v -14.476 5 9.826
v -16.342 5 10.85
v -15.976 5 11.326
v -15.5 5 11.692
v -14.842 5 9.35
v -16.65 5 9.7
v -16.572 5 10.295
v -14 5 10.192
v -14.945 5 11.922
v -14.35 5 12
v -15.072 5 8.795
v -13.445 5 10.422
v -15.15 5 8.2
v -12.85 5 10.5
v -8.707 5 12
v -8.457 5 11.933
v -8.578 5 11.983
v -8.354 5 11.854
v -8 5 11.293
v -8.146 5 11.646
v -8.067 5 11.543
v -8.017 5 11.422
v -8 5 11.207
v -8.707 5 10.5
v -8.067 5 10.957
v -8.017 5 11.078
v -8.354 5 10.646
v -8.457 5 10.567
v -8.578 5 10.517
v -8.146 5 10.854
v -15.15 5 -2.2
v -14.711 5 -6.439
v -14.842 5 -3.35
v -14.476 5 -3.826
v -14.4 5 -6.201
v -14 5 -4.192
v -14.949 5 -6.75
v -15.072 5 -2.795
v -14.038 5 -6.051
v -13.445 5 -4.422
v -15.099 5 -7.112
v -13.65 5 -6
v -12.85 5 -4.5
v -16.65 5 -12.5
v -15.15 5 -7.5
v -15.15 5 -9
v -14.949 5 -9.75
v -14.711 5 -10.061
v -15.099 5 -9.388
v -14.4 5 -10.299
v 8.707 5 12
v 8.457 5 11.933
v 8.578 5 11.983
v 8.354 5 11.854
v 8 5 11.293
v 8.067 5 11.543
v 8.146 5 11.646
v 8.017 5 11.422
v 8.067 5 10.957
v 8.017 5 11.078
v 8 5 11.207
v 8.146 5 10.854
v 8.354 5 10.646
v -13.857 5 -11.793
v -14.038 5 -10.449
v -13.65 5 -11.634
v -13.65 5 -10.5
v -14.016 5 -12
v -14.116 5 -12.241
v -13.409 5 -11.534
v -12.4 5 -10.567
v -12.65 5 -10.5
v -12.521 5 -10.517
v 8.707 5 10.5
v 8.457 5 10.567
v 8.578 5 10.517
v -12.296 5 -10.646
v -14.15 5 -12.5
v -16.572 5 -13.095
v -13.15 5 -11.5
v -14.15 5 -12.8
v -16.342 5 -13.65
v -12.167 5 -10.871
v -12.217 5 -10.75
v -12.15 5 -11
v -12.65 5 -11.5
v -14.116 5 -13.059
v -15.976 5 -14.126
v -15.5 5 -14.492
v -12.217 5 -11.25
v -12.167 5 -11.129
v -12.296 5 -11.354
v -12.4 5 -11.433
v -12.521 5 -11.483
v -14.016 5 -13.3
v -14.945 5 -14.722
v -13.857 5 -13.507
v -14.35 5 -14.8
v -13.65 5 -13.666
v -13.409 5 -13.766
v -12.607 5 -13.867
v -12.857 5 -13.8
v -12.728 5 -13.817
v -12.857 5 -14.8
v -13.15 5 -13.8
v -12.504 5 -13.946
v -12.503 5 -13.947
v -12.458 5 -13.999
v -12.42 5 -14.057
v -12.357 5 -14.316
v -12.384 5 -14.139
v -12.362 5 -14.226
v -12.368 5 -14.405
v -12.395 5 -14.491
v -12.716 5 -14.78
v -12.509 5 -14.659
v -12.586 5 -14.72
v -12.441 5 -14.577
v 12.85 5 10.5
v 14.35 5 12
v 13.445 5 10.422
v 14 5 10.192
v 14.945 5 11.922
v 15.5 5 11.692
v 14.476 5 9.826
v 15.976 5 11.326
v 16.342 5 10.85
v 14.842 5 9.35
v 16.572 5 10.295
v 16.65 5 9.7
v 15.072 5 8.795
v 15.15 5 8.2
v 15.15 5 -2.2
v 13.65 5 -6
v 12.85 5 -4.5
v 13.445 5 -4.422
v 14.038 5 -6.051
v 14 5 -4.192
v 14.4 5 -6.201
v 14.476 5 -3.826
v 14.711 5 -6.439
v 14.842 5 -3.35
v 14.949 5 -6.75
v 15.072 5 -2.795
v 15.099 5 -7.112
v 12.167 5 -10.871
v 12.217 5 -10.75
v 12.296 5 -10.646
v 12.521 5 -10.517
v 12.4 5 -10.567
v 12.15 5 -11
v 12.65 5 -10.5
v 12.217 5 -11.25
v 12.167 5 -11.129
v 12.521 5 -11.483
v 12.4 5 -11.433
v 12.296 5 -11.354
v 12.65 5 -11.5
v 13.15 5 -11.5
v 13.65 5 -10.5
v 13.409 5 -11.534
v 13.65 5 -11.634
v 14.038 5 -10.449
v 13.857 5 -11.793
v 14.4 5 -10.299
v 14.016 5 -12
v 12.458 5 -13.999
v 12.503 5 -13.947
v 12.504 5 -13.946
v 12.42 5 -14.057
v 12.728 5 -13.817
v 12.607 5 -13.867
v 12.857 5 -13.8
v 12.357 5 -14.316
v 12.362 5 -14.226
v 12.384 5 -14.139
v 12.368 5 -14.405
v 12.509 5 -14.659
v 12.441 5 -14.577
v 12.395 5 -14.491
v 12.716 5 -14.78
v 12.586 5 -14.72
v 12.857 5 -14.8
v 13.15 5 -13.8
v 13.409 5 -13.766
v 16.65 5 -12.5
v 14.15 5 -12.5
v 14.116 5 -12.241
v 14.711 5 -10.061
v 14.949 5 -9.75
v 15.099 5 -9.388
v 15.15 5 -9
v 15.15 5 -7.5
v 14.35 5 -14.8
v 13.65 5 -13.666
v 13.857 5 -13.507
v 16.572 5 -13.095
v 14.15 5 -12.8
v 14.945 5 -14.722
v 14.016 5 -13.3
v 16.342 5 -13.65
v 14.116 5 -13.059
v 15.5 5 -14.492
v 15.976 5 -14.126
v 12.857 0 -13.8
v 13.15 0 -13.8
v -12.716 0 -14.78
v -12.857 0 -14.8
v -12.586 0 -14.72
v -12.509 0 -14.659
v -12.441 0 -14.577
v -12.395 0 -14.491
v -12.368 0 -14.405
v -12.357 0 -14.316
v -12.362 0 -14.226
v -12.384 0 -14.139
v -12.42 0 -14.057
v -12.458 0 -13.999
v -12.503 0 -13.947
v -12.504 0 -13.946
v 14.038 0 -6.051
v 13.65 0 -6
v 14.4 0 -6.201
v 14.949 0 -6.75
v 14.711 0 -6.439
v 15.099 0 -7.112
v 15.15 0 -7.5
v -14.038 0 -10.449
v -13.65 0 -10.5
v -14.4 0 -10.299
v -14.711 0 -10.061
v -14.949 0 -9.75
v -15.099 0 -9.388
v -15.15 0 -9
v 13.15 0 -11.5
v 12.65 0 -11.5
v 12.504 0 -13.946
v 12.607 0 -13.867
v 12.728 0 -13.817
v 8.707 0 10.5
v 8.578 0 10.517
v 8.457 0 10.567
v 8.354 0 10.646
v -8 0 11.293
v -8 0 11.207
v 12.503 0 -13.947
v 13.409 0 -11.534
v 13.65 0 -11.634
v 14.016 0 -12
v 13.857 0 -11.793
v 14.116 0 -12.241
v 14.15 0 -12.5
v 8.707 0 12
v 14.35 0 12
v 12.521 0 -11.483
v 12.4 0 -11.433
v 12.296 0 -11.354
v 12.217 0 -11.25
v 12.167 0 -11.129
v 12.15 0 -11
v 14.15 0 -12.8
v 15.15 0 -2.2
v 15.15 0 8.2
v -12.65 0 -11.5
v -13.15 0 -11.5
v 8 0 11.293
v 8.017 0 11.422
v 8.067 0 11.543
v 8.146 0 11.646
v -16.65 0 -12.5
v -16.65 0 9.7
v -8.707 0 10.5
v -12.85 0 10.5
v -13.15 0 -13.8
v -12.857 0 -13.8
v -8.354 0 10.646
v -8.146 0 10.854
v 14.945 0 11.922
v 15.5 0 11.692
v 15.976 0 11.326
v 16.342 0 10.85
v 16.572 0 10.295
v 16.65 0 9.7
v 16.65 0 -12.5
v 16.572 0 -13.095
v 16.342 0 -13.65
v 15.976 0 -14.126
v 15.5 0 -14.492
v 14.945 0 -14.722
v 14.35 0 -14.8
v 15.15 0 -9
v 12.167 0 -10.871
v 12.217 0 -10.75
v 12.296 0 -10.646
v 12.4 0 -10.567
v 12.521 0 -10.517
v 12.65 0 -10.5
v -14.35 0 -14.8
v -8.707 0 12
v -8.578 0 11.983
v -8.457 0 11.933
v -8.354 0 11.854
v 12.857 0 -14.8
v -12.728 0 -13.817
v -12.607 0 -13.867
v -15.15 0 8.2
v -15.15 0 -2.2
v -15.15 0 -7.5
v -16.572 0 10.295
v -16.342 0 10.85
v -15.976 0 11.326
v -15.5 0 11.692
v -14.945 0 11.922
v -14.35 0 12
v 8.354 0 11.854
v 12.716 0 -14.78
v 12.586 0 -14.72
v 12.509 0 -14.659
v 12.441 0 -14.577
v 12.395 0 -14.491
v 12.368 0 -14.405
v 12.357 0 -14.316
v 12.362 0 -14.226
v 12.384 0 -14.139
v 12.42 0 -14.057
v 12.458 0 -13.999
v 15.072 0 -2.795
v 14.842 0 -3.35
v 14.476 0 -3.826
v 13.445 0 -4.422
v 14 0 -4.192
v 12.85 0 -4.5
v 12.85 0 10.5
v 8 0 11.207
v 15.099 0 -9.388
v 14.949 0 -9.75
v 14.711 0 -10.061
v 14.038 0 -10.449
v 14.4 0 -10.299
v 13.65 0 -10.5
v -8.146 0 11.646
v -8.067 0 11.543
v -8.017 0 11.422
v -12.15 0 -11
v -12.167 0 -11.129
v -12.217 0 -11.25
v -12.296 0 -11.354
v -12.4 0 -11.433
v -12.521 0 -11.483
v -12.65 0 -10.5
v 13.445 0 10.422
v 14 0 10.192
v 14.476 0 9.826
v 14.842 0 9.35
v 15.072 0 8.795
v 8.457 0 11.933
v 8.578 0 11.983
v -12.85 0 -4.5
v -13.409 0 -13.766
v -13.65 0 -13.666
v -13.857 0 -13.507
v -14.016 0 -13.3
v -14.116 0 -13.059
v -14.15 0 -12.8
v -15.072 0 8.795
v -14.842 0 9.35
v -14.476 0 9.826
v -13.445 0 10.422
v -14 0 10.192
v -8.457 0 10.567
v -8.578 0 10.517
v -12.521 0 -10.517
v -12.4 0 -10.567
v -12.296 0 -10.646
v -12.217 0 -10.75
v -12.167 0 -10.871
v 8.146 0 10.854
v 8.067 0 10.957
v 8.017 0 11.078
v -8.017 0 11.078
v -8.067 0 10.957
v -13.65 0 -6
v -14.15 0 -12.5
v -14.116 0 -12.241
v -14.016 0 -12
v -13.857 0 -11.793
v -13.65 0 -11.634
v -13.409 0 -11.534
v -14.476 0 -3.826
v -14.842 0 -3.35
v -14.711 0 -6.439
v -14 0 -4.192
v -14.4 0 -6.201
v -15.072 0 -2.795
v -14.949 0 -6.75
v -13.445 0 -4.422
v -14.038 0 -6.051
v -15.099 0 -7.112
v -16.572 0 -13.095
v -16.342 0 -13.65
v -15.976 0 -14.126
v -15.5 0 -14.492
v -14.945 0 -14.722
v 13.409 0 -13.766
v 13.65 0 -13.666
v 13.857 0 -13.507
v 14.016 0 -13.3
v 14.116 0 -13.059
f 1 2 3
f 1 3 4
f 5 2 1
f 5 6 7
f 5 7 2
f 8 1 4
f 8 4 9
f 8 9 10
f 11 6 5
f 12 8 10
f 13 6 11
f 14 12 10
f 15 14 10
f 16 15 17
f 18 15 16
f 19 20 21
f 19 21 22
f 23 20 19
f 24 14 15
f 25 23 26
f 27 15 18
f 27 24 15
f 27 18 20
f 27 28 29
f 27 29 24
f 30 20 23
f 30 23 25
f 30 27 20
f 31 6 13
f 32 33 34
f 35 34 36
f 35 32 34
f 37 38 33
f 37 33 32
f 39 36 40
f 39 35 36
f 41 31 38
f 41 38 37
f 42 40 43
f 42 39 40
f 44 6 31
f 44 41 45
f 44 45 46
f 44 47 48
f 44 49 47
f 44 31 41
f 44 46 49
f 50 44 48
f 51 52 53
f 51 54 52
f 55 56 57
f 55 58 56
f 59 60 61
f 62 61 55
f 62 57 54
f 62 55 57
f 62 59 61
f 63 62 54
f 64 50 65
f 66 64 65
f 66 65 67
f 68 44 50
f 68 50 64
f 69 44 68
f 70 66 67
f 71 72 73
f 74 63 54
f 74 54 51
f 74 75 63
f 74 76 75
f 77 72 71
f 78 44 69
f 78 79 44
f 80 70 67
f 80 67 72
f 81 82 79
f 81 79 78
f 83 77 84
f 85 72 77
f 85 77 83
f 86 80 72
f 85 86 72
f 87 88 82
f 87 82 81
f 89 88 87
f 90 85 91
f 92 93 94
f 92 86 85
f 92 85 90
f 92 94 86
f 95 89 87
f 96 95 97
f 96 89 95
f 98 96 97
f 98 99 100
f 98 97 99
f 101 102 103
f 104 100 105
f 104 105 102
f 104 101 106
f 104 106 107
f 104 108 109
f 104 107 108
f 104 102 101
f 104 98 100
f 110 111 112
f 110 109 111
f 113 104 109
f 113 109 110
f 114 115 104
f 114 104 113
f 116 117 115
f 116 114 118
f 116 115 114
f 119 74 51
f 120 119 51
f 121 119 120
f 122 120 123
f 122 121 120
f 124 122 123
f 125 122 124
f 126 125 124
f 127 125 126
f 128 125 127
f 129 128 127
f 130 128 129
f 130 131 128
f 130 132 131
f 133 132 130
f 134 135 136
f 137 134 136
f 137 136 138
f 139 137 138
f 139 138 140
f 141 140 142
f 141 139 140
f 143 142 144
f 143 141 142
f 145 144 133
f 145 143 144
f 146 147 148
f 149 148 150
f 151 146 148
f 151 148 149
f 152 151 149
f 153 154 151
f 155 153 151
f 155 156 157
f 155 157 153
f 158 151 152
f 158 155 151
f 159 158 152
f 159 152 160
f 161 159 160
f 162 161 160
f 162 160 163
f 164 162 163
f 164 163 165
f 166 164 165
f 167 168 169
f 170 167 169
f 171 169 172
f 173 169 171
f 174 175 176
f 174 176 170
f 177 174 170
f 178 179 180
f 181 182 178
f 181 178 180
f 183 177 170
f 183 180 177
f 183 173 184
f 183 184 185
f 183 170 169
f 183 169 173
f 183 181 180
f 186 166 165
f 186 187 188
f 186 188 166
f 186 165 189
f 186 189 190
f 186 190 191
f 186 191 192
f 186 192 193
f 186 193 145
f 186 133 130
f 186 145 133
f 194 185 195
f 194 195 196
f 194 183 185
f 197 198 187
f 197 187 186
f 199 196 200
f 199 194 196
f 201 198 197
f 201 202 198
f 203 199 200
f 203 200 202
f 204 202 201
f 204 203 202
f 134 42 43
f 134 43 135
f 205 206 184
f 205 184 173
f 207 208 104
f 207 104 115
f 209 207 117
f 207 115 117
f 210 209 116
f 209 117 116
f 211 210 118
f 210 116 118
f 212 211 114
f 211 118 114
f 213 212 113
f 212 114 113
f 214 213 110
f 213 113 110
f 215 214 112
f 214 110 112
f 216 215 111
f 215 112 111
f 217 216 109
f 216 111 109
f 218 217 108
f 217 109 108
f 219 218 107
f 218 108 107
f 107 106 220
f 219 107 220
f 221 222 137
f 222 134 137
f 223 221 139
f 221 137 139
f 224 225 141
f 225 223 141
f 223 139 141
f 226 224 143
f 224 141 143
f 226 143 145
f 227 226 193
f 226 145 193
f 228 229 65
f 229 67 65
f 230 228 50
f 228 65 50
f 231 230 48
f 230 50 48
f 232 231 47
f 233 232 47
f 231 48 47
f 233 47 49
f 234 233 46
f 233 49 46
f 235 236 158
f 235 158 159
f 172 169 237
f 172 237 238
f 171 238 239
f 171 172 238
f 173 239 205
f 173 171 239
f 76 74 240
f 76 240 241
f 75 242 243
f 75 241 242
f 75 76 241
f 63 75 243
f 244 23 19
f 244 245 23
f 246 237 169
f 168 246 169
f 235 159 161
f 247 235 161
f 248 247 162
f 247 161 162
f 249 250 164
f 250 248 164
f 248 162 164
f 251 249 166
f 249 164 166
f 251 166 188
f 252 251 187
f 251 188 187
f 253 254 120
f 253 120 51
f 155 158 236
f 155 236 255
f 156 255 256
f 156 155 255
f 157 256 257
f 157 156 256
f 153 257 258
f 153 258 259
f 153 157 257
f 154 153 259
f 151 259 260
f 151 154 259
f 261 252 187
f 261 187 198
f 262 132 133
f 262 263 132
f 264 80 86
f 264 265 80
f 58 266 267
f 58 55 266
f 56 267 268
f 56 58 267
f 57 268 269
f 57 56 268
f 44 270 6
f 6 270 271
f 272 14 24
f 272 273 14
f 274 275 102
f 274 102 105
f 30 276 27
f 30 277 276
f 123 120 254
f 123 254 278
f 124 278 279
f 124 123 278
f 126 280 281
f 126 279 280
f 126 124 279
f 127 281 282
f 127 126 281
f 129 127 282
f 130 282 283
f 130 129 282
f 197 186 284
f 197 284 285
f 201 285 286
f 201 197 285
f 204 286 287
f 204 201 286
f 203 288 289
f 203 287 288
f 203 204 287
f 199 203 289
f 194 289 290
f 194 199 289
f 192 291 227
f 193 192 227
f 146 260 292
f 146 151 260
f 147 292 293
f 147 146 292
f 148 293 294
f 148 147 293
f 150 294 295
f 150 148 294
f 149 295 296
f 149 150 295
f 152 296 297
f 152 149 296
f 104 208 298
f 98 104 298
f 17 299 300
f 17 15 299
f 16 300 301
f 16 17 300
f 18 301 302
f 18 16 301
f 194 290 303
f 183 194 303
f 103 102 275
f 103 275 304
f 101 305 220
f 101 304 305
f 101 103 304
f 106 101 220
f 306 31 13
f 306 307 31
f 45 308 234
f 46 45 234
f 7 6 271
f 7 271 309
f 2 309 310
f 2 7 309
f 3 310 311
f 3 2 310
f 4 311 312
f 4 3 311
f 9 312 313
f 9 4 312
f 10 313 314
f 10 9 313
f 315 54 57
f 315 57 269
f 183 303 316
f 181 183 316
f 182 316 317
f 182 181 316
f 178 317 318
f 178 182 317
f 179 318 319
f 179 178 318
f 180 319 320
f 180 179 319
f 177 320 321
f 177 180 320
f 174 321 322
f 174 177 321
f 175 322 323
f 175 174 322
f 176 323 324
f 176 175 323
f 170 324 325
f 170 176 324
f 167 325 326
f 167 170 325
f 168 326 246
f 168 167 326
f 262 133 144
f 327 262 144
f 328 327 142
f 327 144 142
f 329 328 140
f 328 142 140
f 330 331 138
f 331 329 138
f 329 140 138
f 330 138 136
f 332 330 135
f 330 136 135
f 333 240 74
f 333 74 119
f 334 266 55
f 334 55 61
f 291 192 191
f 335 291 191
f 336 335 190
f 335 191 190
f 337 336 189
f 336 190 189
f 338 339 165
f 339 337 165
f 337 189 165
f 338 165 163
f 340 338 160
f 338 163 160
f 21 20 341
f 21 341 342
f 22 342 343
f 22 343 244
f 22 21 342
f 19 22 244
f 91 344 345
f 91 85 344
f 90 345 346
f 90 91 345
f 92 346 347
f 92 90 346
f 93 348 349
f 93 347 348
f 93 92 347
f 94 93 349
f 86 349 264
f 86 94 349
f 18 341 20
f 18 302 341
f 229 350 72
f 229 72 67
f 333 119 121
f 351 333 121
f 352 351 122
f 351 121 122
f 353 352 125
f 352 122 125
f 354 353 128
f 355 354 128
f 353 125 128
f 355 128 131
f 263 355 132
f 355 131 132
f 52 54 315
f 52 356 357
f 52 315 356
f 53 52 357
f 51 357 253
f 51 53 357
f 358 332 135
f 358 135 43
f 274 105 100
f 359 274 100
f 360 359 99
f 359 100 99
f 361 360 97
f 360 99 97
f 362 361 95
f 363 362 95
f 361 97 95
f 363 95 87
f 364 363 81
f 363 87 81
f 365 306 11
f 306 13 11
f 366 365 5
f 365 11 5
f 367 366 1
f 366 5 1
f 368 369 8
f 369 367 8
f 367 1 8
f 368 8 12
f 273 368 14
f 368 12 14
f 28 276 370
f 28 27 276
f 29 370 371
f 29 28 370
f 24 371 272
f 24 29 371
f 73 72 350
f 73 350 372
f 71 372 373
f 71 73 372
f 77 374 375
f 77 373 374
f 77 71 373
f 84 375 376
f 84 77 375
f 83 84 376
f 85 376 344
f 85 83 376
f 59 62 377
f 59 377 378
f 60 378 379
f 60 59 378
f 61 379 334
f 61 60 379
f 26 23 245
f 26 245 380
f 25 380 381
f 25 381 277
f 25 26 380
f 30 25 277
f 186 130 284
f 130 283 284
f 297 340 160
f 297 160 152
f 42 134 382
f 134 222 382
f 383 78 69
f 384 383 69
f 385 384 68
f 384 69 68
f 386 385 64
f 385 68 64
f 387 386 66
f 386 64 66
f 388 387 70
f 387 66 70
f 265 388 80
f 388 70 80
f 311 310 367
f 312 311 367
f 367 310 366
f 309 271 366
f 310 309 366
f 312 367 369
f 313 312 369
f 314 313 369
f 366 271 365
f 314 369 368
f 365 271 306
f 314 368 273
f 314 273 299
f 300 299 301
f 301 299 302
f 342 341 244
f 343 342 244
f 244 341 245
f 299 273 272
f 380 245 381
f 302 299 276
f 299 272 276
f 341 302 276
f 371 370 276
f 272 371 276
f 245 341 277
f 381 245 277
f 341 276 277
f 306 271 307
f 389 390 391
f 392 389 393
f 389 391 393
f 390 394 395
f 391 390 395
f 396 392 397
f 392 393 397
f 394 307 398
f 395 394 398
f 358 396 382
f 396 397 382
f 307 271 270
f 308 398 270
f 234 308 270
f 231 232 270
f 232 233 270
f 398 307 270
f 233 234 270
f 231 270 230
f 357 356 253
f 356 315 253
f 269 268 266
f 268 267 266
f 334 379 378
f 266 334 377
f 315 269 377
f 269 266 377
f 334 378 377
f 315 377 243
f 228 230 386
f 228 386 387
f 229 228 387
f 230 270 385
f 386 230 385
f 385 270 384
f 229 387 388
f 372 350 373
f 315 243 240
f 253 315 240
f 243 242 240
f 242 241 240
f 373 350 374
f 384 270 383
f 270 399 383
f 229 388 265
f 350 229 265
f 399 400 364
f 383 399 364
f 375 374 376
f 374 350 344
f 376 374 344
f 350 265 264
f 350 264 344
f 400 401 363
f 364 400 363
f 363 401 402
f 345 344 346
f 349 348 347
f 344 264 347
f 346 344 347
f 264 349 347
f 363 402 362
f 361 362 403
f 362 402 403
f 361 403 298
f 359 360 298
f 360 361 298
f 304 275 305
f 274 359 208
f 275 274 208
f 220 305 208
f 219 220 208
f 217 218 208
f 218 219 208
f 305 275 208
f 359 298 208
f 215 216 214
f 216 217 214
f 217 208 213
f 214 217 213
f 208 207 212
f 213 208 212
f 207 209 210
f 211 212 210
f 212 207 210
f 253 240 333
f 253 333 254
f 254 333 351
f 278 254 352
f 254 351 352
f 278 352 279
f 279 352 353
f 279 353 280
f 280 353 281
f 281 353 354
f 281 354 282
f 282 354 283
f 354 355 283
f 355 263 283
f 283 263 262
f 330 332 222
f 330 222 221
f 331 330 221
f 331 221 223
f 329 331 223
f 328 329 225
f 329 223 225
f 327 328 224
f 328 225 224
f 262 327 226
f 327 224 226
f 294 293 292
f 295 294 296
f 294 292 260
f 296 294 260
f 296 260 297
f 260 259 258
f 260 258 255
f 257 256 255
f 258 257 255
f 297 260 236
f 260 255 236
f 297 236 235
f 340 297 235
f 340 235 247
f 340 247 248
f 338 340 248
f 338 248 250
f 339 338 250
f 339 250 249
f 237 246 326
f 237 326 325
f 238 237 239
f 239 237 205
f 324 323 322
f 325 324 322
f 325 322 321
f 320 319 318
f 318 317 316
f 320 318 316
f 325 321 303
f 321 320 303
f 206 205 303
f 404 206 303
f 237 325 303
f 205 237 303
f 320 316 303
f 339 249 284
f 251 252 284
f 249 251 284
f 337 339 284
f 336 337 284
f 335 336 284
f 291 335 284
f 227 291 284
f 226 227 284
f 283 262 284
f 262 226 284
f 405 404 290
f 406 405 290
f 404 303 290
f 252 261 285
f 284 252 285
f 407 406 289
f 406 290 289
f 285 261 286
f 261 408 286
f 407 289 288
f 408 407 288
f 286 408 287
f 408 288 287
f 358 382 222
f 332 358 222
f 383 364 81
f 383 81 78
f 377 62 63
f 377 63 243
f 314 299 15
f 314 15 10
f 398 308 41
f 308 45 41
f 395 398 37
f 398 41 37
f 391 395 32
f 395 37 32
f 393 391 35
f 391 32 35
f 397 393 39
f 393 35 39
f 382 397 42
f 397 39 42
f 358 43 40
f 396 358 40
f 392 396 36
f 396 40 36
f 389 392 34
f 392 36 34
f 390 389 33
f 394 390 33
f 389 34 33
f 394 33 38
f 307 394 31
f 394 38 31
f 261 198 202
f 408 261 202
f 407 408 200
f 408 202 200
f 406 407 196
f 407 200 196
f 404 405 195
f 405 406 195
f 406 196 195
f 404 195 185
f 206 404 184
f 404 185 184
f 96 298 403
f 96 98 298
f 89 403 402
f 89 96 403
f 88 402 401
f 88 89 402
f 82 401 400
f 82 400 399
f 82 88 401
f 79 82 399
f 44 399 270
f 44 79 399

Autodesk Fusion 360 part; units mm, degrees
sketch "Sketch1" plane through (0, 0, 0) normal (0, 1, 0) x (1, 0, 0)
  line L0 (-12.15, 14.8) -> (-16.65, 14.8)
  line L1 (-16.65, 14.8) -> (-12.15, 14.8)
  line L2 (-12.15, 13.8) -> (-14.15, 13.8)
  line L3 (-15.15, -10.5) -> (-8, -10.5)
  line L4 (-8, -10.5) -> (-8, -12)
  line L5 (-8, -12) -> (-16.65, -12)
  line L6 (-12.15, 13.8) -> (-12.15, 14.8)
  line L7 (-14.15, 13.8) -> (-14.15, 11.5)
  line L8 (-14.15, 11.5) -> (-12.15, 11.5)
  line L9 (-12.15, 11.5) -> (-12.15, 10.5)
  line L10 (-12.15, 10.5) -> (-15.15, 10.5)
  line L11 (-16.65, 14.8) -> (-16.65, -12)
  line L12 (0, 6) -> (-15.15, 6)
  line L13 (-15.15, 6) -> (-15.15, 10.5)
  line L14 (0, 6) -> (0, 4.5)
  line L15 (0, 4.5) -> (-15.15, 4.5)
  line L16 (-15.15, 4.5) -> (-15.15, -10.5)
  dimension "d1" = 2.3
  dimension "d2" = 1
  dimension "d3" = 1
  dimension "d5" = 2
  dimension "d8" = 1.5
  dimension "d11" = 8
  dimension "d13" = 10.5
  dimension "d14" = 10.5
  dimension "d17" = 1
  dimension "d28" = 1.5
  dimension "d29" = 1.5
  dimension "d30" = 4.5
  dimension "d34" = 14.15
extrude "Extrude1" add sketch "Sketch1" along normal blind 5 makes body 1
chamfer "Chamfer1" distance 0.5 angle 45 3 edges at (-12.15, 2.5, -13.8) (-8, 2.5, 12) (-8, 2.5, 10.5) on bodies 1
fillet "Fillet1" radius 0.5 6 edges at (-8, 2.5, 11.5) (-8, 2.5, 11) (-8.5, 2.5, 12) (-8.5, 2.5, 10.5) (-12.15, 2.5, -14.3) (-12.65, 2.5, -13.8) on bodies 1
fillet "Fillet2" radius 2.3 4 edges at (-16.65, 2.5, 12) (-16.65, 2.5, -14.8) (-15.15, 2.5, -4.5) (-15.15, 2.5, 10.5) on bodies 1
fillet "Fillet3" radius 0.5 3 edges at (-12.15, 2.5, -14.8) (-12.15, 2.5, -11.5) (-12.15, 2.5, -10.5) on bodies 1
fillet "Fillet4" radius 1 2 edges at (-14.15, 2.5, -13.8) (-14.15, 2.5, -11.5) on bodies 1
fillet "Fillet5" radius 1.5 2 edges at (-15.15, 2.5, -10.5) (-15.15, 2.5, -6) on bodies 1
mirror "Mirror1" about plane through (0, 0, -6) normal (1, 0, 0) of bodies 1 makes body 2
combine "Combine1" operation add target body 1 tool bodies 2
